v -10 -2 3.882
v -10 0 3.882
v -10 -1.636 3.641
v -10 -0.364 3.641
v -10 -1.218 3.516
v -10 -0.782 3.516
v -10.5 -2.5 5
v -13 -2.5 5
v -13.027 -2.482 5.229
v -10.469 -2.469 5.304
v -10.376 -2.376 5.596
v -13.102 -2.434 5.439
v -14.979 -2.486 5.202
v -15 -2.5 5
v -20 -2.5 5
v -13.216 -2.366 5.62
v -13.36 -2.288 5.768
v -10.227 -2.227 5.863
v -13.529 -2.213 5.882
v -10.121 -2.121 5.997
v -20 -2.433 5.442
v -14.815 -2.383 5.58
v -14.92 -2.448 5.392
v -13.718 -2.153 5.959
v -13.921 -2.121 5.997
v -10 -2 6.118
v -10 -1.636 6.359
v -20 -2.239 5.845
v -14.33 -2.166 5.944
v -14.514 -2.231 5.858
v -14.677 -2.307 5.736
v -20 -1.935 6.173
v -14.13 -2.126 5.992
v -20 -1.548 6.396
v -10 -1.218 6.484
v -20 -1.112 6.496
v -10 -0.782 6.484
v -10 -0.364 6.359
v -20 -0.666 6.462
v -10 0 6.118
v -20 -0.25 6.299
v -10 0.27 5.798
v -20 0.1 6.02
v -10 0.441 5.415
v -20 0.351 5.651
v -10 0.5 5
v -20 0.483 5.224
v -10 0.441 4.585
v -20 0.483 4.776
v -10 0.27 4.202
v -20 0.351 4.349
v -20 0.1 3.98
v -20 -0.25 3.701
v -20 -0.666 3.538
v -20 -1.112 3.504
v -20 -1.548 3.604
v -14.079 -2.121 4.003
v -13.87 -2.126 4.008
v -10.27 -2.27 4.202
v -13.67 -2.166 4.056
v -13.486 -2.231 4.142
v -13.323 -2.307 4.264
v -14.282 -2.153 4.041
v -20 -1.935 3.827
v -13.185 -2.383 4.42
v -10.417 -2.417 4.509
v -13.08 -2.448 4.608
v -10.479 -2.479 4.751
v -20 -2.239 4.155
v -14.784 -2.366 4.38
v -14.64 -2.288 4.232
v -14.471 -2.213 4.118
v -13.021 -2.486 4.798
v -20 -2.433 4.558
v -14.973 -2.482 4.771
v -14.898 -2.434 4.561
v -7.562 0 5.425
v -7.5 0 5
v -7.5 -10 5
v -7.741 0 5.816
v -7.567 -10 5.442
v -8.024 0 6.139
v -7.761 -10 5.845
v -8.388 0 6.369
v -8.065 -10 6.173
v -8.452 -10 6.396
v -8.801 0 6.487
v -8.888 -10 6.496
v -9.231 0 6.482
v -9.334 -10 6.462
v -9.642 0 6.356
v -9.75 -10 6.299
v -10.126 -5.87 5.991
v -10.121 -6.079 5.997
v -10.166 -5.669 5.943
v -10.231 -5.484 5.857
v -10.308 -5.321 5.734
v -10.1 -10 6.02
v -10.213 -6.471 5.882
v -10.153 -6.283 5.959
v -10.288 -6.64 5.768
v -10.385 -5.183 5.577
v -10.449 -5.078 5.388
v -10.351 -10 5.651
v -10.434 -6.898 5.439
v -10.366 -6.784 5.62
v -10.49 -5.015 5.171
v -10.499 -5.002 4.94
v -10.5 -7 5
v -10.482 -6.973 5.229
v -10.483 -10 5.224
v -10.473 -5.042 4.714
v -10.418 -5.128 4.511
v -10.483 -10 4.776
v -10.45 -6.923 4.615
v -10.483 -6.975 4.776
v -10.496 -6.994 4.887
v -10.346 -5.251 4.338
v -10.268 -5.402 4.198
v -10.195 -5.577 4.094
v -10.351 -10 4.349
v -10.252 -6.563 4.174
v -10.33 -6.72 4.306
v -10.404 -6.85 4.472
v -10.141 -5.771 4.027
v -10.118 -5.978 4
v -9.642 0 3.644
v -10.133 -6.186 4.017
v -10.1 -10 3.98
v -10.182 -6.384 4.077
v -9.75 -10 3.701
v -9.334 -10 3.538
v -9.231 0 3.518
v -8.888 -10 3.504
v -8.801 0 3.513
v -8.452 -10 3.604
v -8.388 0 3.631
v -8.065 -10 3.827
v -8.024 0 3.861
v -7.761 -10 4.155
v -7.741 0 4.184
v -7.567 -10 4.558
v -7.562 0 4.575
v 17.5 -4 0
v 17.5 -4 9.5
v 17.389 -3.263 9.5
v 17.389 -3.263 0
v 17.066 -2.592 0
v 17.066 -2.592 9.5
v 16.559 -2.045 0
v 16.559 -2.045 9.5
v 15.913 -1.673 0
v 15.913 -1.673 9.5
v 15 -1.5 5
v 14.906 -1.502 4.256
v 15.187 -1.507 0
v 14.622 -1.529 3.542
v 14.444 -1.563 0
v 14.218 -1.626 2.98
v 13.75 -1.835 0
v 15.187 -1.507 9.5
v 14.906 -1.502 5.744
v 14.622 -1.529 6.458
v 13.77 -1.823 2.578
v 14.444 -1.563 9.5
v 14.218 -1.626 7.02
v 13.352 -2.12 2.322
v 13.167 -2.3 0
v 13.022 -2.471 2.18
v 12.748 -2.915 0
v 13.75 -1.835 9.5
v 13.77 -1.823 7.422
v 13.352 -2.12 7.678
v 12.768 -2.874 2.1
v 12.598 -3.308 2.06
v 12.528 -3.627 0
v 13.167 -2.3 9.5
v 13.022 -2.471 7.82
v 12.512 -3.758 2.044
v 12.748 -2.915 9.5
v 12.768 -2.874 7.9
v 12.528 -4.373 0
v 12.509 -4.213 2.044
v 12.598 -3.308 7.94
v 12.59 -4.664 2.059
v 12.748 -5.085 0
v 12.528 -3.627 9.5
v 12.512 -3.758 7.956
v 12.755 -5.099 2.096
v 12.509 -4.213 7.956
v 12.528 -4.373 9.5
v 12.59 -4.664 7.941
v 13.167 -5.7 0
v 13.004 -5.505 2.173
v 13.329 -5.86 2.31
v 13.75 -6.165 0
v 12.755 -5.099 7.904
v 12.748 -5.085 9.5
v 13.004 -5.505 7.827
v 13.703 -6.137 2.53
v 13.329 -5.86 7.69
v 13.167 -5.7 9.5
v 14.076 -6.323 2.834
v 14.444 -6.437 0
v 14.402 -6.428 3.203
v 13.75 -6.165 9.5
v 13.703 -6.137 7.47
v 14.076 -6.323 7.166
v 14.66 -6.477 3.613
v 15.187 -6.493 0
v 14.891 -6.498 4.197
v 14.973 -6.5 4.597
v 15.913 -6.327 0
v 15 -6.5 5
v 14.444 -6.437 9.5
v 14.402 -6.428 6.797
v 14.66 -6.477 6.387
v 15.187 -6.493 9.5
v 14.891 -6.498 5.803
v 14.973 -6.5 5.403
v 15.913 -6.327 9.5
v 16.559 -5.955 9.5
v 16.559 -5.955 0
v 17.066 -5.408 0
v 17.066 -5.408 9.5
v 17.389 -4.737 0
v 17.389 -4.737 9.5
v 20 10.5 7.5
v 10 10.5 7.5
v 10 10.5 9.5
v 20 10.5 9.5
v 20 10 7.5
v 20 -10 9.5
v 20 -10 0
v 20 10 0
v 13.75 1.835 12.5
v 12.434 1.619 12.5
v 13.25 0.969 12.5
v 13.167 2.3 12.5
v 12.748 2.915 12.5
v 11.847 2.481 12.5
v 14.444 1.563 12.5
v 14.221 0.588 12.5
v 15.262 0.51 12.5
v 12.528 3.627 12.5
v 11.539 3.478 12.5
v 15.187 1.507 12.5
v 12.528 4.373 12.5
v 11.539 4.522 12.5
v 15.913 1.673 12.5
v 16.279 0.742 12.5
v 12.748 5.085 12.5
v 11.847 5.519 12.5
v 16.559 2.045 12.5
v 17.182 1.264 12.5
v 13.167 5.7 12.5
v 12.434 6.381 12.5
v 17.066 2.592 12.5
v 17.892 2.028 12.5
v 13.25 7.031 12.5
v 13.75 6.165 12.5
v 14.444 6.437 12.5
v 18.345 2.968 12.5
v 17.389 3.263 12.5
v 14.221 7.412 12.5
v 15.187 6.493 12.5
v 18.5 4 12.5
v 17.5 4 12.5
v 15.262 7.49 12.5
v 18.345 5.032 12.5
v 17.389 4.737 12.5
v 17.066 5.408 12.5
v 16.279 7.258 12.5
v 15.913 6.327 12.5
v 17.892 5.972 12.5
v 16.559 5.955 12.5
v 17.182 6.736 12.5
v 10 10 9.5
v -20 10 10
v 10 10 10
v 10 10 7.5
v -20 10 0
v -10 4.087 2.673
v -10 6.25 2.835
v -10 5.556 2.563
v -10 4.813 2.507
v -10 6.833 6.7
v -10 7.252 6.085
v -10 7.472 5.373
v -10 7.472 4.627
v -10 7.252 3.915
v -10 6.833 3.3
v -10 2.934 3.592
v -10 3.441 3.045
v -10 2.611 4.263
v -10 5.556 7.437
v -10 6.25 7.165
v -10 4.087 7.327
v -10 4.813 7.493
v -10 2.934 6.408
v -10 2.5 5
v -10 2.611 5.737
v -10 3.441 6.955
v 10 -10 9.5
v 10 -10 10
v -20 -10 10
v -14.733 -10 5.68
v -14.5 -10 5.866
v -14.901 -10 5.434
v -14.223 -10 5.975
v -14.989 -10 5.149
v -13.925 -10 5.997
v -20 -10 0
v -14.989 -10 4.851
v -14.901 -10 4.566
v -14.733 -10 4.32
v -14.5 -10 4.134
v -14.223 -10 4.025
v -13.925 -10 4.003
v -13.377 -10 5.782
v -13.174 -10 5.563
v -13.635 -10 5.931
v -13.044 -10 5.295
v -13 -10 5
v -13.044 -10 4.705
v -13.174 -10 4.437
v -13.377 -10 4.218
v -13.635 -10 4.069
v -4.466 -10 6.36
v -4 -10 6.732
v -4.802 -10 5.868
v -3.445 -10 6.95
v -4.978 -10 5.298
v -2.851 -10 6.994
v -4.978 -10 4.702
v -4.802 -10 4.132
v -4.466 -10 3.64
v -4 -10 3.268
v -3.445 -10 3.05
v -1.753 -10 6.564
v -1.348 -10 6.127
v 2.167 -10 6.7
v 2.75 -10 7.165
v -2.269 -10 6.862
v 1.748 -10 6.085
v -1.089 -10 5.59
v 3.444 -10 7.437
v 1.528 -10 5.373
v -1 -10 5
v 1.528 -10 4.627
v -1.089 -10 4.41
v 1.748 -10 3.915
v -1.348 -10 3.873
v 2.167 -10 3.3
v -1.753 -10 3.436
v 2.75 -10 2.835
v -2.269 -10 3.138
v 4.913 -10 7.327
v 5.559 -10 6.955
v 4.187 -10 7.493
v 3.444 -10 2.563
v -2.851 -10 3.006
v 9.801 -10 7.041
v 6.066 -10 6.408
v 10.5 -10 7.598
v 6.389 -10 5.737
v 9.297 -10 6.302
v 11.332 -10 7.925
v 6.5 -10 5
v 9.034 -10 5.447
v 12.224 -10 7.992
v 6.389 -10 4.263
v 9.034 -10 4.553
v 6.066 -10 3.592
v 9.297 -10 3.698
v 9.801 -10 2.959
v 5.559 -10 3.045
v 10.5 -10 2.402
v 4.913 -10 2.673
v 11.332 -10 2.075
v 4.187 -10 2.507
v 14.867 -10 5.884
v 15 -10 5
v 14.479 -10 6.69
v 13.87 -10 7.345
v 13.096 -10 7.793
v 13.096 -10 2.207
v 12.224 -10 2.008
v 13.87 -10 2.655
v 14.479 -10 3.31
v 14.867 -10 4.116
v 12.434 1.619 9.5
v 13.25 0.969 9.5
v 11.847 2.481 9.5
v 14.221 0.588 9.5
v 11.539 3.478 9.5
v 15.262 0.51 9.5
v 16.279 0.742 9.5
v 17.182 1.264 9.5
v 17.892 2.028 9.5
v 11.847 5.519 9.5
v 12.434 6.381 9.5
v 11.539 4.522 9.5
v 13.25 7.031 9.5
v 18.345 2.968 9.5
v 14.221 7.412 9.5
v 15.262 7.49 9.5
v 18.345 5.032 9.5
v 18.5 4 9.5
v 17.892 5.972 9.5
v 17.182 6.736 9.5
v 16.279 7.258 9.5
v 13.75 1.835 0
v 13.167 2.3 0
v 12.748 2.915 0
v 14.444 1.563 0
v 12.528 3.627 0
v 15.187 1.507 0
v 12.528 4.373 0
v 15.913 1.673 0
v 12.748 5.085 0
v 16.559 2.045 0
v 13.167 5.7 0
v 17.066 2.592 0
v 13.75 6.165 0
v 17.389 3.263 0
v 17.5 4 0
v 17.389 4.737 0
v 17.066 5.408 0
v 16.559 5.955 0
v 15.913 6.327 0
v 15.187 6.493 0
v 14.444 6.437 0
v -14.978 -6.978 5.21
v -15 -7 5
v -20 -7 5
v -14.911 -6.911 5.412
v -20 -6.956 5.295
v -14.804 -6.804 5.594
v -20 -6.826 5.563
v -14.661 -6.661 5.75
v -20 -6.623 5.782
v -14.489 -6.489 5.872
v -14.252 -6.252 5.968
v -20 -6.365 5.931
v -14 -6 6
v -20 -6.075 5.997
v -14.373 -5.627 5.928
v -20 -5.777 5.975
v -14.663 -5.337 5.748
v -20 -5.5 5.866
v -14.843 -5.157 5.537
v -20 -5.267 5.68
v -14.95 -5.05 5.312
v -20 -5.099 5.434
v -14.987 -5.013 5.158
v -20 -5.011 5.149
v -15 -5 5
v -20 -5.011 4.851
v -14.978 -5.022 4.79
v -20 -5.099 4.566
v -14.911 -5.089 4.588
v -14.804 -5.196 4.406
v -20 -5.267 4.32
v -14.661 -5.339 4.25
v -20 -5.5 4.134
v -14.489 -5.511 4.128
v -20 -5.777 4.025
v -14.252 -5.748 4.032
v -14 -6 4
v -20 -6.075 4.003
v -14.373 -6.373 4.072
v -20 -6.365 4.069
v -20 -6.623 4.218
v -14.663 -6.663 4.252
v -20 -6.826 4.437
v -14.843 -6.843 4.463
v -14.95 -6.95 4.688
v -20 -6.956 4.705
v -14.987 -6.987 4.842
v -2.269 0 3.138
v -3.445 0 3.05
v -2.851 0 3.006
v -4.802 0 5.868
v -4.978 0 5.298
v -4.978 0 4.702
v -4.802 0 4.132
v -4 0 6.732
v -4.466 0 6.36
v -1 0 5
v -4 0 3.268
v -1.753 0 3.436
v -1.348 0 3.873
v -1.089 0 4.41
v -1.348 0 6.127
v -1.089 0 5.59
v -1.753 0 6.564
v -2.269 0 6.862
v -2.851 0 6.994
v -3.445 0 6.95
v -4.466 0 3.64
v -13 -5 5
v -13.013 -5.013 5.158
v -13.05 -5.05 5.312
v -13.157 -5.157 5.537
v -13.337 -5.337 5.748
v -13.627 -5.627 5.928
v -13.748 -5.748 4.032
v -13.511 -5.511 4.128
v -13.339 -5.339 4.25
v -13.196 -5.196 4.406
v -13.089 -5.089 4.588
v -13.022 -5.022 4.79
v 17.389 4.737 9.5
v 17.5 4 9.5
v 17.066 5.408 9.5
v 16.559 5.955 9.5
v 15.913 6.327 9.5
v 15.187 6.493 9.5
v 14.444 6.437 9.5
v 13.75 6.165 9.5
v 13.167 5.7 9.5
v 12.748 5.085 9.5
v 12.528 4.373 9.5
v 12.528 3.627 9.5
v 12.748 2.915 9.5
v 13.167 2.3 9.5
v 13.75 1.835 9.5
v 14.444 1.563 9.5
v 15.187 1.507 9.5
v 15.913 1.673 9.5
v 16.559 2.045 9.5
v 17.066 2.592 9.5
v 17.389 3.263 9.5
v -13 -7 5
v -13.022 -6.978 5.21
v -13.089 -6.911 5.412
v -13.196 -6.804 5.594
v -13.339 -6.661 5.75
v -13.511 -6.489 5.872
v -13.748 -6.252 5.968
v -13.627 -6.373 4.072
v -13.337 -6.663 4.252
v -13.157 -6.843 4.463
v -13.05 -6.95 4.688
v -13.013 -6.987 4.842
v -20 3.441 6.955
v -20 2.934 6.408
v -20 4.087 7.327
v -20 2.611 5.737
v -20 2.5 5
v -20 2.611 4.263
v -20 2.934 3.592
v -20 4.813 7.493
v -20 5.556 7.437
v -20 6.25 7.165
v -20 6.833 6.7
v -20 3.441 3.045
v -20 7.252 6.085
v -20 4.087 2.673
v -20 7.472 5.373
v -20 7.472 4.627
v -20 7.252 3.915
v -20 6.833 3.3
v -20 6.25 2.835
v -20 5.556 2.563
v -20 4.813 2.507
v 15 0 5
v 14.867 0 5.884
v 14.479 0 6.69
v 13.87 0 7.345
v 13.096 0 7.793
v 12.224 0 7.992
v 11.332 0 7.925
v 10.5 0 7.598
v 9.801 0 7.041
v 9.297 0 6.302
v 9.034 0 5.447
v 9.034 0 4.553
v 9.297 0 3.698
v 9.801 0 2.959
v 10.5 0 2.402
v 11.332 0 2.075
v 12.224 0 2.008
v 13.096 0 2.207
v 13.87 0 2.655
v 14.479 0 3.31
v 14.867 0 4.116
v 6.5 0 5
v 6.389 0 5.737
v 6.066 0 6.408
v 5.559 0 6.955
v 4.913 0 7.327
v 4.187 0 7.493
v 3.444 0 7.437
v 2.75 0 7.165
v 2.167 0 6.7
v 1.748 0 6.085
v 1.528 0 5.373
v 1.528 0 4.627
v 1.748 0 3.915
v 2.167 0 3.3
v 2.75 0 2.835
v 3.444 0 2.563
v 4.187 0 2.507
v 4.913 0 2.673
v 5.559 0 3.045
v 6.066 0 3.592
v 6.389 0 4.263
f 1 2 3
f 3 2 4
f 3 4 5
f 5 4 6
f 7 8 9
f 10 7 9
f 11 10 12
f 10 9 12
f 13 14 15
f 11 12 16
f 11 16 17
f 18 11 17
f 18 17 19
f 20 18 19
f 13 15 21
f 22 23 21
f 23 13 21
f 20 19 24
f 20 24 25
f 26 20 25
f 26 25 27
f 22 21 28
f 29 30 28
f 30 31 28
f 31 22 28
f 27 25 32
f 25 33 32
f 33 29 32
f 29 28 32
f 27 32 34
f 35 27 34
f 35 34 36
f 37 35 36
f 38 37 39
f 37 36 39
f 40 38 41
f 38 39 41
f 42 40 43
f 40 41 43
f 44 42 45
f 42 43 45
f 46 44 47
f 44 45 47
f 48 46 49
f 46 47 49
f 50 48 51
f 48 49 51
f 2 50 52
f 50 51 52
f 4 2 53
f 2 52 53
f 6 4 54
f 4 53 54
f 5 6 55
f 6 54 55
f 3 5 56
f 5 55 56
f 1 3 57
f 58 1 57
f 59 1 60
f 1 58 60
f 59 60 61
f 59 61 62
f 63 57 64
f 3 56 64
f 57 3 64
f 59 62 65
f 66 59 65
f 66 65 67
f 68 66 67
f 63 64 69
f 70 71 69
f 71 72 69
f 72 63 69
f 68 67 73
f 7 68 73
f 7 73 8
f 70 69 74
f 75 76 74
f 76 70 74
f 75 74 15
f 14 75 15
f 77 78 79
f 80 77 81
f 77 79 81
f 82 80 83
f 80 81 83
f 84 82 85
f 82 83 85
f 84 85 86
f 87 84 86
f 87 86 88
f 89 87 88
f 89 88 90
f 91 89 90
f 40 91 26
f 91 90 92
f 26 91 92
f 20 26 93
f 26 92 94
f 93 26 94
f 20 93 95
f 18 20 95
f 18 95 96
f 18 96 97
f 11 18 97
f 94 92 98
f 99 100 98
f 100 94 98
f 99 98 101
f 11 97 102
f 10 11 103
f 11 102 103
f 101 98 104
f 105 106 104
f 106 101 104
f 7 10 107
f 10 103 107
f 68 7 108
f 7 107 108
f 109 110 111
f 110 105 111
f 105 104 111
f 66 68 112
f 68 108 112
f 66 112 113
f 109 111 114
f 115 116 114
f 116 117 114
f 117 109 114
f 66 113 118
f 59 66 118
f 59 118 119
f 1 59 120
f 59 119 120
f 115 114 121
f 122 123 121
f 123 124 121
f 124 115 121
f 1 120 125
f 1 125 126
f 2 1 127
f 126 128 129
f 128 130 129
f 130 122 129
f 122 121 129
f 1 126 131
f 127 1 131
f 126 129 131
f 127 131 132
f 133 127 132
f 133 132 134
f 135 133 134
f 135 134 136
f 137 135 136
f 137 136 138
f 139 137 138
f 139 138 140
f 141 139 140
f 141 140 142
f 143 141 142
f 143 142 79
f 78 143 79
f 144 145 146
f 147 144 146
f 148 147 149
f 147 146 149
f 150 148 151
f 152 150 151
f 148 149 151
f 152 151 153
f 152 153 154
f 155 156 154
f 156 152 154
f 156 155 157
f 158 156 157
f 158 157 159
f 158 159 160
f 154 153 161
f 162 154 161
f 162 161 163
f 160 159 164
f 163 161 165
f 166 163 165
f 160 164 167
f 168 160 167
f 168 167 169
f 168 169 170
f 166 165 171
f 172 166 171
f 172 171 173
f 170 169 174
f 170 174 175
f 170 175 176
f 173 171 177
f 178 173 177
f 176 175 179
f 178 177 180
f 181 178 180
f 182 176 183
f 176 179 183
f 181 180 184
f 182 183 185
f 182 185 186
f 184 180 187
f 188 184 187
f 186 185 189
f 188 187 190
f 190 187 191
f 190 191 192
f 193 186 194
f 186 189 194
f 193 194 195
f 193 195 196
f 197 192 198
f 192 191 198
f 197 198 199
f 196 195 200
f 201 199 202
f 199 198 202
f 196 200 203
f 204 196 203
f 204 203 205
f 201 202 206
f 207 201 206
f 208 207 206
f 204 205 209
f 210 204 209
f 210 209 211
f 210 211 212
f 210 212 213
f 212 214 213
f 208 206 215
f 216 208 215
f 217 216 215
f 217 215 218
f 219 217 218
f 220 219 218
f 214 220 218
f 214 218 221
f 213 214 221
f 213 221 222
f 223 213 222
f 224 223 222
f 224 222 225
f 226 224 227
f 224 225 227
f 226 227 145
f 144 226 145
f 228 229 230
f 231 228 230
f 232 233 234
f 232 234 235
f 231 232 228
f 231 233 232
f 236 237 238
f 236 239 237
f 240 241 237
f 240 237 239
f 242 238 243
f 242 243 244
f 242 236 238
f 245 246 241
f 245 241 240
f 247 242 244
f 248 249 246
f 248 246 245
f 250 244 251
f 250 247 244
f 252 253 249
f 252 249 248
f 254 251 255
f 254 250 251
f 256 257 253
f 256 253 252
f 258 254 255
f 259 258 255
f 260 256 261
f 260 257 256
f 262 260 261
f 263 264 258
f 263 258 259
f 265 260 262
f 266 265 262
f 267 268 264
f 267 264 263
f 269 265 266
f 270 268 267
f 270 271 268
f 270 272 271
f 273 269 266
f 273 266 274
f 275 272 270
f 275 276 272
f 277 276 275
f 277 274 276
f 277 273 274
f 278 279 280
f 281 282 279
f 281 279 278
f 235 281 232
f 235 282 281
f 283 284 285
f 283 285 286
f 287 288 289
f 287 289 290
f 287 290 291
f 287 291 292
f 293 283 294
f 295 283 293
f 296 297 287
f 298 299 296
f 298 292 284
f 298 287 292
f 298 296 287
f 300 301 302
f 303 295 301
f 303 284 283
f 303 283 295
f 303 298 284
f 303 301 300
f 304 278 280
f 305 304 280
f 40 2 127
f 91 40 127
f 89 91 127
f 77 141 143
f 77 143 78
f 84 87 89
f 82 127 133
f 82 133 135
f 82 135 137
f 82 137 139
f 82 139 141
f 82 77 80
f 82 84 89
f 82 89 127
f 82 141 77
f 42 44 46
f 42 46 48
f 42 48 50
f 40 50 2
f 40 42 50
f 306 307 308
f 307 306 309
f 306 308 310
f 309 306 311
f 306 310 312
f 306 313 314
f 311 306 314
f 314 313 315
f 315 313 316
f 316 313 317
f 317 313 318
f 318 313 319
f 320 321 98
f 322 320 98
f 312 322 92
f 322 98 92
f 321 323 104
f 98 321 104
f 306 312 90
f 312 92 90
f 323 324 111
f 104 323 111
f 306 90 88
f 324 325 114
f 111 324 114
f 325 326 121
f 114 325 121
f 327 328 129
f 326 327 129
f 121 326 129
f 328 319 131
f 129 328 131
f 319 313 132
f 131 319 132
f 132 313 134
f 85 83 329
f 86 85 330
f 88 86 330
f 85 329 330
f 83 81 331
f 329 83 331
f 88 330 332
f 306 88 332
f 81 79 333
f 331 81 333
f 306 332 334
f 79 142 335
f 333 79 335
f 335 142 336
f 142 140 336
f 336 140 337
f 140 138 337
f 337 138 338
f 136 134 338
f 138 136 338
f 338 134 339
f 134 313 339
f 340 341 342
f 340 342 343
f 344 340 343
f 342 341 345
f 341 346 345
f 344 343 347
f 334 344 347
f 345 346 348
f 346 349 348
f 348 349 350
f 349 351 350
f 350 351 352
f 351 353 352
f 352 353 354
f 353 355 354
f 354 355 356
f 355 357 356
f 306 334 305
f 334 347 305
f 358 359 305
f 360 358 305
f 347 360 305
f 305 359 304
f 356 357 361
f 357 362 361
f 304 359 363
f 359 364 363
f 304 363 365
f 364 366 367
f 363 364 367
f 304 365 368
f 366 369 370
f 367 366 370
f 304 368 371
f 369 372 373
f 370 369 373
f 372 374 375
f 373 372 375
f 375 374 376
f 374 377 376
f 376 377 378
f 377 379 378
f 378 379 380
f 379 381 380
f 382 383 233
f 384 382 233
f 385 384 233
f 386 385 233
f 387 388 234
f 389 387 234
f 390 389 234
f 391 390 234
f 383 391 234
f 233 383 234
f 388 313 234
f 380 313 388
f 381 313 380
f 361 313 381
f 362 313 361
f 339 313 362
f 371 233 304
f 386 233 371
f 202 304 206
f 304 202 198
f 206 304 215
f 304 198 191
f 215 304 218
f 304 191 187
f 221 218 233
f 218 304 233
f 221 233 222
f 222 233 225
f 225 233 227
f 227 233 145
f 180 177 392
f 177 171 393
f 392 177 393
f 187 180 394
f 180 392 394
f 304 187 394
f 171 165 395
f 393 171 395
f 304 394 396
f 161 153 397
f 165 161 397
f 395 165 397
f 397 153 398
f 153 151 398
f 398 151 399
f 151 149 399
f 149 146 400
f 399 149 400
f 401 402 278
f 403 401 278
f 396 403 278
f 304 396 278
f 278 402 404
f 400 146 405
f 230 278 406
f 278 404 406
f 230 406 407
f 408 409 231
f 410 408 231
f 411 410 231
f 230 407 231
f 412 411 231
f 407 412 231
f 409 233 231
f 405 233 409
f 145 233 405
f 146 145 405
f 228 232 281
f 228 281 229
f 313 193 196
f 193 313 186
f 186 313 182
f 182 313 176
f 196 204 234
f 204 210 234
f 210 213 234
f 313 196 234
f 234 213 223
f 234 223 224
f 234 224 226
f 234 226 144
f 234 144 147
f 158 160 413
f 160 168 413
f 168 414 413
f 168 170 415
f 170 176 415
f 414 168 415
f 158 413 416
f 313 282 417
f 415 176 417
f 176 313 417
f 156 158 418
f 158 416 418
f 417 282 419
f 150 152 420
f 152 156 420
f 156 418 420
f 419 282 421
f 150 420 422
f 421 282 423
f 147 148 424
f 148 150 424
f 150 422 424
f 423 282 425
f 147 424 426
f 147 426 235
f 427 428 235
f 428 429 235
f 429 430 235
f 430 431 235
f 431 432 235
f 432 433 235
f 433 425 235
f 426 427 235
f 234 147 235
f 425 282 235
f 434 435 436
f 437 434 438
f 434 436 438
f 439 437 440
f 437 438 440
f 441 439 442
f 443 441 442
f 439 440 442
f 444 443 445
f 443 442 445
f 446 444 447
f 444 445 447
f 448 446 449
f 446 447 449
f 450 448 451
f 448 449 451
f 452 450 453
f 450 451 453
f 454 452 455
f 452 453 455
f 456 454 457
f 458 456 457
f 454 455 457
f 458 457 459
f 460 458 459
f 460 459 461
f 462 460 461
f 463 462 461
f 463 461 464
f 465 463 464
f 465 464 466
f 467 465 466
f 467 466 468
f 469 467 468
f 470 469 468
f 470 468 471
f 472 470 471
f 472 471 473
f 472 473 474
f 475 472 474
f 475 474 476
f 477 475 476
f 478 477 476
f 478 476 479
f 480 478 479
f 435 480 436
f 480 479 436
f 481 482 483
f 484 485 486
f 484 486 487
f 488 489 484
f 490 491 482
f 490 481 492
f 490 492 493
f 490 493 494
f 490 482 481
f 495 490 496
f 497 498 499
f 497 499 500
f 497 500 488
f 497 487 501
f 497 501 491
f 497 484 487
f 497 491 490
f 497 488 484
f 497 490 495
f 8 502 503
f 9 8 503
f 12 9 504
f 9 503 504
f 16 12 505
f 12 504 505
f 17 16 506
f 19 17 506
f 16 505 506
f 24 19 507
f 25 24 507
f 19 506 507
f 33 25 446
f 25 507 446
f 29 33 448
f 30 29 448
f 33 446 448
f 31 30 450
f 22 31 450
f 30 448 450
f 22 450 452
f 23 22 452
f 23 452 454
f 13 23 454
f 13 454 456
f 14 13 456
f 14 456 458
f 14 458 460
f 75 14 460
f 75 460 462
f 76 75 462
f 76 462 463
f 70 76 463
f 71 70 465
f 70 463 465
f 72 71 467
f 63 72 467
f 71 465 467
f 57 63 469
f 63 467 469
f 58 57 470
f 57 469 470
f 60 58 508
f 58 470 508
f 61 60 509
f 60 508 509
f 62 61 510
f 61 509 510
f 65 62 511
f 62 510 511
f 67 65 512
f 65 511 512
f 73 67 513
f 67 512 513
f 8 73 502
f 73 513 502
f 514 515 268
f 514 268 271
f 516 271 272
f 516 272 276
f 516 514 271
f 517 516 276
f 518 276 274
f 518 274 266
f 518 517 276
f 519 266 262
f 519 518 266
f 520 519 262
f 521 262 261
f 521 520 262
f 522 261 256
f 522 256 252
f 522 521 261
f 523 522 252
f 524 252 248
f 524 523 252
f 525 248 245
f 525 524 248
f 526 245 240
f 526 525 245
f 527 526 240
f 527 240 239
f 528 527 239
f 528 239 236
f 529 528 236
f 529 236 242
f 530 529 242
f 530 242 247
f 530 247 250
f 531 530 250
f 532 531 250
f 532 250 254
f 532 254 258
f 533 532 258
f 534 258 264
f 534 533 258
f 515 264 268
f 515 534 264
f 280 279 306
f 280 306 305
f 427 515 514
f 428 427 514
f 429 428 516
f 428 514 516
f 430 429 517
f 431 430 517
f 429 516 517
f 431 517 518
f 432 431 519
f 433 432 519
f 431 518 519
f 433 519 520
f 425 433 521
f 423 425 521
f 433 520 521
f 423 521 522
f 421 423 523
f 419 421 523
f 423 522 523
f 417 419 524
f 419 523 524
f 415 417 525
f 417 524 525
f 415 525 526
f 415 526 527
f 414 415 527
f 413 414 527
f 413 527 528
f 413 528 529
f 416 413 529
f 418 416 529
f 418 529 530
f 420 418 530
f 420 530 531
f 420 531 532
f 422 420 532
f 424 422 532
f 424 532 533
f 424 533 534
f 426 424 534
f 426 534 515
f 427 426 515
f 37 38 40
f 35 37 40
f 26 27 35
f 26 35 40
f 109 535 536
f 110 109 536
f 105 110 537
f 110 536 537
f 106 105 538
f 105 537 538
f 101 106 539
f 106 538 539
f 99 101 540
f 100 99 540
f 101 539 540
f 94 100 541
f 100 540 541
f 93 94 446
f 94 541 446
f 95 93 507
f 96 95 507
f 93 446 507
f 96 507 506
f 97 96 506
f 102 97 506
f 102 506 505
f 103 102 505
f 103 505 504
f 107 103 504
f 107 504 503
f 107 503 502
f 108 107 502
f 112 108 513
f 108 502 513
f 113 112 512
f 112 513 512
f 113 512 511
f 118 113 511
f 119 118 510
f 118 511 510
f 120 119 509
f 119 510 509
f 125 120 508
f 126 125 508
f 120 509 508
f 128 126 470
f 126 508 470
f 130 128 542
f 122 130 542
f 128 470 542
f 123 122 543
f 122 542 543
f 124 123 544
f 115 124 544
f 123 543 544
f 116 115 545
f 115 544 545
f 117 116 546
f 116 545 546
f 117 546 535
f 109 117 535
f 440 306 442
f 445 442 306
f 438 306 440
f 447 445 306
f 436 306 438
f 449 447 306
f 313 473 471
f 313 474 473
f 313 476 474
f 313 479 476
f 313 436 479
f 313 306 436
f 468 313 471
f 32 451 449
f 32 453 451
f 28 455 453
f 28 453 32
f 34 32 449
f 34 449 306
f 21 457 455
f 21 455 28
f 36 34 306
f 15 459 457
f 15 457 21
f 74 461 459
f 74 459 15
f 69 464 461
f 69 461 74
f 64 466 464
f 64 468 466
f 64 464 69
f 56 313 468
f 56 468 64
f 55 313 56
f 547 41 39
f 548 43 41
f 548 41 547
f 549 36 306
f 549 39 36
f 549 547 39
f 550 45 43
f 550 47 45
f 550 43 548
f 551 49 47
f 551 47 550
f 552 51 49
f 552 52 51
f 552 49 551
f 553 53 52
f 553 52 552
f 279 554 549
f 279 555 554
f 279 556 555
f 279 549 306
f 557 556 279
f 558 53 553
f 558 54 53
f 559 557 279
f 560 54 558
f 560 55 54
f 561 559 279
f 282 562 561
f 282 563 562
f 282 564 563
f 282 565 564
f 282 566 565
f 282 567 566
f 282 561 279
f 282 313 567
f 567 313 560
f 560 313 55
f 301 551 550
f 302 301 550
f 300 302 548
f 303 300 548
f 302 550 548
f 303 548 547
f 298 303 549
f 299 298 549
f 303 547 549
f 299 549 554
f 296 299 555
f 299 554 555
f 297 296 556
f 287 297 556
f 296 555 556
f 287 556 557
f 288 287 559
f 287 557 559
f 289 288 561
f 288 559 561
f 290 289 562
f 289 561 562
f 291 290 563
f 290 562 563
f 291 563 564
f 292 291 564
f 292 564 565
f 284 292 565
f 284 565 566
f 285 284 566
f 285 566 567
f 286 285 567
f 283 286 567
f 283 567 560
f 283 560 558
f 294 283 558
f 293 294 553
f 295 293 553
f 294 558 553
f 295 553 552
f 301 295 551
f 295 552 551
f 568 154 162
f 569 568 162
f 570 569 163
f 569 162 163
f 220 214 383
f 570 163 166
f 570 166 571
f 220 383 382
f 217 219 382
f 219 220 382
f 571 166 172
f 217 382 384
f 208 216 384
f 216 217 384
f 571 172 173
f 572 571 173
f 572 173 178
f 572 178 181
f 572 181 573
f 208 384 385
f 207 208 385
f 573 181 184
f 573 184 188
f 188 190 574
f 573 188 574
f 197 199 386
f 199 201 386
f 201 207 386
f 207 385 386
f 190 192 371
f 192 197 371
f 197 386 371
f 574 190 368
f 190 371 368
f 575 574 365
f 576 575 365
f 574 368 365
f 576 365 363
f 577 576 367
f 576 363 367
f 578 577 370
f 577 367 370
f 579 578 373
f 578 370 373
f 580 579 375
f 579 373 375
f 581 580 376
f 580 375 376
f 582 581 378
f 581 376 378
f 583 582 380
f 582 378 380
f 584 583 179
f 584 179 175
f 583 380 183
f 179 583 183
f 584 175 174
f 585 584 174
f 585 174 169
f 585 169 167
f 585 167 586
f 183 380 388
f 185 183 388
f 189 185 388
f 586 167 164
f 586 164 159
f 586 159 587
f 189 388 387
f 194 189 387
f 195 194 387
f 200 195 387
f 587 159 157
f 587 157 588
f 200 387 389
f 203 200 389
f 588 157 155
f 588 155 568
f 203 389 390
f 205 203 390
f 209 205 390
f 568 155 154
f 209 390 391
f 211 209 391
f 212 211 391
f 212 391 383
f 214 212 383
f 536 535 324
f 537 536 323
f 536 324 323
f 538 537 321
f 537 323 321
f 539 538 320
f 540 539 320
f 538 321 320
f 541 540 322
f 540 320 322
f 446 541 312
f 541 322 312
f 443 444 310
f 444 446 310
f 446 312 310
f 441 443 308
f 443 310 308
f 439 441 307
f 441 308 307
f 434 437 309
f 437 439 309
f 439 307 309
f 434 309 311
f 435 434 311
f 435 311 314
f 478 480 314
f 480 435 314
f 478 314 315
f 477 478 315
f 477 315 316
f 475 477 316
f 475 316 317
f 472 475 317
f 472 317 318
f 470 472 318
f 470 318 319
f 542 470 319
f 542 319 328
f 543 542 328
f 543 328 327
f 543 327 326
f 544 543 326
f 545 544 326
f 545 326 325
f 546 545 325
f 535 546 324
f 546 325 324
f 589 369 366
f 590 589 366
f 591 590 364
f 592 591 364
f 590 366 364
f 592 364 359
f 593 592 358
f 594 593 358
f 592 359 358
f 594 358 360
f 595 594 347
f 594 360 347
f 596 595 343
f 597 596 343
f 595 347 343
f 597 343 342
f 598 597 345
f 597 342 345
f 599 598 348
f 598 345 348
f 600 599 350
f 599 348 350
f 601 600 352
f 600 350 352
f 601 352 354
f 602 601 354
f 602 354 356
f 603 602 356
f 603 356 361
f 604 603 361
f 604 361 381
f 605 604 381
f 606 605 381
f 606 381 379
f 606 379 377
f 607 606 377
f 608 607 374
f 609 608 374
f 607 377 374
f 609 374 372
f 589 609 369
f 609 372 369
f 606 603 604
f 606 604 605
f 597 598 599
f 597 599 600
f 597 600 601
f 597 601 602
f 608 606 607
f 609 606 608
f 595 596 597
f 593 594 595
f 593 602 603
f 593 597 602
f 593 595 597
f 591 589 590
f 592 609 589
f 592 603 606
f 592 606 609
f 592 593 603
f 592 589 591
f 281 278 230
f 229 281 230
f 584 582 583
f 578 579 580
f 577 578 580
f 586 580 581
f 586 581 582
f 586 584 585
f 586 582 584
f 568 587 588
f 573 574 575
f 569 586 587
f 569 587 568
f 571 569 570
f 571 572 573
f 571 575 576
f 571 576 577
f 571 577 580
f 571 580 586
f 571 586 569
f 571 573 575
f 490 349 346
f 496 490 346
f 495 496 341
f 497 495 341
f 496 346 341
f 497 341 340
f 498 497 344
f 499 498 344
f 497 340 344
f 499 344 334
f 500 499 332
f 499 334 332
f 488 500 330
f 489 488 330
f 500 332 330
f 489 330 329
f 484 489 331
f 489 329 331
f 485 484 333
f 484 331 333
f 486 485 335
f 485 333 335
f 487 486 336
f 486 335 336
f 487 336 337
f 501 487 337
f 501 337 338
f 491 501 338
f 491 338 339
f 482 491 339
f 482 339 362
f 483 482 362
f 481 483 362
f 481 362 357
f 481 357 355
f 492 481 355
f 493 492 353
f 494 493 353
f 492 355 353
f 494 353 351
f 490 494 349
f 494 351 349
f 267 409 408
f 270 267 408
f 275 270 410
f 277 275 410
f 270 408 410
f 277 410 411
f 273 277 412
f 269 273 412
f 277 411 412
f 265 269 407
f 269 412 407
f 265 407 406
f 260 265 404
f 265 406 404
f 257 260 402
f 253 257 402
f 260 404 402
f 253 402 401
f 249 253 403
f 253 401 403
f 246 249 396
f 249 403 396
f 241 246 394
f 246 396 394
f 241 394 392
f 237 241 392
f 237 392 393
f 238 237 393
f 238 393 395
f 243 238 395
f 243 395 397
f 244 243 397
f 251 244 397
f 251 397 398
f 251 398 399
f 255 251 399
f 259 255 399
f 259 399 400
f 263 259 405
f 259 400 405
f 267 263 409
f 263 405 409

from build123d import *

# Parameters (mm, degrees)
F0_W      = 40
F0_H      = 20
F1_DEPTH  = 10
F2_R      = 1
F2_R_2    = 2.5
F2_R_3    = 1.5
F3_DEPTH  = 10
F4_R      = 1.5
F4_R_2    = 2
F4_R_3    = 2.5
F4_R_4    = 3
F4_R_5    = 1
F5_DEPTH  = 10
F6_W      = 10
F6_H      = 0.5
F7_DEPTH  = 20.001
F8_R      = 2.5
F9_DEPTH  = 9.501
F10_R     = 3.5
F10_R_2   = 2.5
F11_DEPTH = 3
F12_W     = 0.5
F12_H     = 2
F13_DEPTH = 10


with BuildPart() as f1:
    # F0 (on Top) → F1 (new body)
    with BuildSketch(Plane.XY):
        Rectangle(F0_W, F0_H)
    extrude(amount=F1_DEPTH)

    # F2 (on face) → F3 (cut)
    with BuildSketch(Plane(origin=(-20, 0, 0), x_dir=(0, -1, 0), z_dir=(-1, 0, 0))):
        with Locations((6, 5)):
            Circle(F2_R)
        with Locations((-5, 5)):
            Circle(F2_R_2)
        with Locations((1, 5)):
            Circle(F2_R_3)
    extrude(amount=-F3_DEPTH, mode=Mode.SUBTRACT)

    # F4 (on face) → F5 (cut)
    with BuildSketch(Plane.XZ.offset(10)):
        with Locations((-9, 5)):
            Circle(F4_R)
        with Locations((-3, 5)):
            Circle(F4_R_2)
        with Locations((4, 5)):
            Circle(F4_R_3)
        with Locations((12, 5)):
            Circle(F4_R_4)
        with Locations((-14, 5)):
            Circle(F4_R_5)
    extrude(amount=-F5_DEPTH, mode=Mode.SUBTRACT)

    # F6 (on face) → F7 (cut, through all)
    with BuildSketch(Plane.XZ.offset(10)):
        with Locations((15, 9.75)):
            Rectangle(F6_W, F6_H)
    extrude(amount=-F7_DEPTH, mode=Mode.SUBTRACT)

    # F8 (on face) → F9 (cut, through all)
    with BuildSketch(Plane.XY.offset(9.5)):
        with Locations((15, 4)):
            Circle(F8_R)
        with Locations((15, -4)):
            Circle(F8_R)
    extrude(amount=-F9_DEPTH, mode=Mode.SUBTRACT)

    # F10 (on face) → F11 (join)
    with BuildSketch(Plane.XY.offset(9.5)):
        with Locations((15, 4)):
            Circle(F10_R)
        with Locations((15, 4)):
            Circle(F10_R_2, mode=Mode.SUBTRACT)
    extrude(amount=F11_DEPTH)

    # F12 (on face) → F13 (join)
    with BuildSketch(Plane.YZ.offset(20)):
        with Locations((10.25, 8.5)):
            Rectangle(F12_W, F12_H)
    extrude(amount=-F13_DEPTH)


solid = f1.part
